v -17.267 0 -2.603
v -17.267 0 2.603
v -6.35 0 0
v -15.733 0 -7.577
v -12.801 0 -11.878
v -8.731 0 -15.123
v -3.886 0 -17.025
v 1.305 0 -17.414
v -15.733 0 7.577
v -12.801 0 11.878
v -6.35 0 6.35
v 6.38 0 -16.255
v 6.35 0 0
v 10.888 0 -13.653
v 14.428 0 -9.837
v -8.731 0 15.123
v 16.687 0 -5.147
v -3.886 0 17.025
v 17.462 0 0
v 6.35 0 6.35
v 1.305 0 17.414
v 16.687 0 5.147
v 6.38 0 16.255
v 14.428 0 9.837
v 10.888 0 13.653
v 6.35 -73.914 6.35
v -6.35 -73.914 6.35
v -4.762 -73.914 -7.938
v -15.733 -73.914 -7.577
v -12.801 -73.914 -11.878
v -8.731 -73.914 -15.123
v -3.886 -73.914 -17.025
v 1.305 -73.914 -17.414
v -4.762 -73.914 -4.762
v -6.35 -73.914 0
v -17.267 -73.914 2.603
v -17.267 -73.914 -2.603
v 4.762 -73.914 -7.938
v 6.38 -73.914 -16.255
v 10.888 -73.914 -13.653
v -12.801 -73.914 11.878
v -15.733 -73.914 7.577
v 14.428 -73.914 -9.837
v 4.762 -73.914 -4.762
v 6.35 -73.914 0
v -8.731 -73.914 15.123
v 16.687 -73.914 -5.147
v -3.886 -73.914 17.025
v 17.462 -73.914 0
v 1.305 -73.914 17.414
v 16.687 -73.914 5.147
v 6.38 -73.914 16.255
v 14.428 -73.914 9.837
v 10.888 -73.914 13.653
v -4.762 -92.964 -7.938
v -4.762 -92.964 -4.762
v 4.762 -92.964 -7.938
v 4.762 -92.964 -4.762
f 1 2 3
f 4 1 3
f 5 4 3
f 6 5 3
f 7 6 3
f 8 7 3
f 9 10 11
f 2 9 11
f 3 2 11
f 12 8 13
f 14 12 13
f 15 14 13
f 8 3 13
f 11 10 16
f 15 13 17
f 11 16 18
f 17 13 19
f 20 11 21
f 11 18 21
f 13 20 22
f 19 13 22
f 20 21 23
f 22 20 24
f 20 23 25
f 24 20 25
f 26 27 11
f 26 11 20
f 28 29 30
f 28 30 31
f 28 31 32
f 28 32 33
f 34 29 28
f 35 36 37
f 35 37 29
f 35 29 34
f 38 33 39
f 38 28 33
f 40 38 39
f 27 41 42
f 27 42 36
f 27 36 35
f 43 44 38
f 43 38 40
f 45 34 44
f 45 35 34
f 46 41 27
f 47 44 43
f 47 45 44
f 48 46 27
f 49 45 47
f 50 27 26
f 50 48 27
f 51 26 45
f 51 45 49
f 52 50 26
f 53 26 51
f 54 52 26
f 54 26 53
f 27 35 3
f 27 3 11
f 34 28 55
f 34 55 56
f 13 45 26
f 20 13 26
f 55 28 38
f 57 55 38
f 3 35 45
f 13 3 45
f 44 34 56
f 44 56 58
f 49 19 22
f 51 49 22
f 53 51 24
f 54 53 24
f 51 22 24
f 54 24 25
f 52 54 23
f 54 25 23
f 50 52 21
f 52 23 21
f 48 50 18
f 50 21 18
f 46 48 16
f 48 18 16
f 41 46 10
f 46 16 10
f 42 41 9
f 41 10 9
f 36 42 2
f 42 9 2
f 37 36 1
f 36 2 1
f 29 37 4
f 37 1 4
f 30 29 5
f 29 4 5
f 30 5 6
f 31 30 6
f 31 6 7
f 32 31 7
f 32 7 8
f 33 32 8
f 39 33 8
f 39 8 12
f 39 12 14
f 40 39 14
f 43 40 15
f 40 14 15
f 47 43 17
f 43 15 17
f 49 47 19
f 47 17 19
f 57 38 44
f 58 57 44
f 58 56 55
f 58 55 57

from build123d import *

# Parameters (mm, degrees)
F0_R     = 17.4625
F1_DEPTH = 73.914
F2_W     = 12.7
F2_H     = 6.35
F3_DEPTH = 178.054
F4_W     = 9.525
F4_H     = 3.175
F5_DEPTH = 19.05


with BuildPart() as f1:
    # F0 (on Front) → F1 (new body)
    with BuildSketch(Plane.XZ):
        Circle(F0_R)
    extrude(amount=F1_DEPTH)

    # F2 (on face) → F3 (cut)
    with BuildSketch(Plane.XZ.offset(73.914)):
        with Locations((0, 3.175)):
            Rectangle(F2_W, F2_H)
    extrude(amount=-F3_DEPTH, mode=Mode.SUBTRACT)

    # F4 (on face) → F5 (join)
    with BuildSketch(Plane.XZ.offset(73.914)):
        with Locations((0, -6.35)):
            Rectangle(F4_W, F4_H)
    extrude(amount=F5_DEPTH)


solid = f1.part
